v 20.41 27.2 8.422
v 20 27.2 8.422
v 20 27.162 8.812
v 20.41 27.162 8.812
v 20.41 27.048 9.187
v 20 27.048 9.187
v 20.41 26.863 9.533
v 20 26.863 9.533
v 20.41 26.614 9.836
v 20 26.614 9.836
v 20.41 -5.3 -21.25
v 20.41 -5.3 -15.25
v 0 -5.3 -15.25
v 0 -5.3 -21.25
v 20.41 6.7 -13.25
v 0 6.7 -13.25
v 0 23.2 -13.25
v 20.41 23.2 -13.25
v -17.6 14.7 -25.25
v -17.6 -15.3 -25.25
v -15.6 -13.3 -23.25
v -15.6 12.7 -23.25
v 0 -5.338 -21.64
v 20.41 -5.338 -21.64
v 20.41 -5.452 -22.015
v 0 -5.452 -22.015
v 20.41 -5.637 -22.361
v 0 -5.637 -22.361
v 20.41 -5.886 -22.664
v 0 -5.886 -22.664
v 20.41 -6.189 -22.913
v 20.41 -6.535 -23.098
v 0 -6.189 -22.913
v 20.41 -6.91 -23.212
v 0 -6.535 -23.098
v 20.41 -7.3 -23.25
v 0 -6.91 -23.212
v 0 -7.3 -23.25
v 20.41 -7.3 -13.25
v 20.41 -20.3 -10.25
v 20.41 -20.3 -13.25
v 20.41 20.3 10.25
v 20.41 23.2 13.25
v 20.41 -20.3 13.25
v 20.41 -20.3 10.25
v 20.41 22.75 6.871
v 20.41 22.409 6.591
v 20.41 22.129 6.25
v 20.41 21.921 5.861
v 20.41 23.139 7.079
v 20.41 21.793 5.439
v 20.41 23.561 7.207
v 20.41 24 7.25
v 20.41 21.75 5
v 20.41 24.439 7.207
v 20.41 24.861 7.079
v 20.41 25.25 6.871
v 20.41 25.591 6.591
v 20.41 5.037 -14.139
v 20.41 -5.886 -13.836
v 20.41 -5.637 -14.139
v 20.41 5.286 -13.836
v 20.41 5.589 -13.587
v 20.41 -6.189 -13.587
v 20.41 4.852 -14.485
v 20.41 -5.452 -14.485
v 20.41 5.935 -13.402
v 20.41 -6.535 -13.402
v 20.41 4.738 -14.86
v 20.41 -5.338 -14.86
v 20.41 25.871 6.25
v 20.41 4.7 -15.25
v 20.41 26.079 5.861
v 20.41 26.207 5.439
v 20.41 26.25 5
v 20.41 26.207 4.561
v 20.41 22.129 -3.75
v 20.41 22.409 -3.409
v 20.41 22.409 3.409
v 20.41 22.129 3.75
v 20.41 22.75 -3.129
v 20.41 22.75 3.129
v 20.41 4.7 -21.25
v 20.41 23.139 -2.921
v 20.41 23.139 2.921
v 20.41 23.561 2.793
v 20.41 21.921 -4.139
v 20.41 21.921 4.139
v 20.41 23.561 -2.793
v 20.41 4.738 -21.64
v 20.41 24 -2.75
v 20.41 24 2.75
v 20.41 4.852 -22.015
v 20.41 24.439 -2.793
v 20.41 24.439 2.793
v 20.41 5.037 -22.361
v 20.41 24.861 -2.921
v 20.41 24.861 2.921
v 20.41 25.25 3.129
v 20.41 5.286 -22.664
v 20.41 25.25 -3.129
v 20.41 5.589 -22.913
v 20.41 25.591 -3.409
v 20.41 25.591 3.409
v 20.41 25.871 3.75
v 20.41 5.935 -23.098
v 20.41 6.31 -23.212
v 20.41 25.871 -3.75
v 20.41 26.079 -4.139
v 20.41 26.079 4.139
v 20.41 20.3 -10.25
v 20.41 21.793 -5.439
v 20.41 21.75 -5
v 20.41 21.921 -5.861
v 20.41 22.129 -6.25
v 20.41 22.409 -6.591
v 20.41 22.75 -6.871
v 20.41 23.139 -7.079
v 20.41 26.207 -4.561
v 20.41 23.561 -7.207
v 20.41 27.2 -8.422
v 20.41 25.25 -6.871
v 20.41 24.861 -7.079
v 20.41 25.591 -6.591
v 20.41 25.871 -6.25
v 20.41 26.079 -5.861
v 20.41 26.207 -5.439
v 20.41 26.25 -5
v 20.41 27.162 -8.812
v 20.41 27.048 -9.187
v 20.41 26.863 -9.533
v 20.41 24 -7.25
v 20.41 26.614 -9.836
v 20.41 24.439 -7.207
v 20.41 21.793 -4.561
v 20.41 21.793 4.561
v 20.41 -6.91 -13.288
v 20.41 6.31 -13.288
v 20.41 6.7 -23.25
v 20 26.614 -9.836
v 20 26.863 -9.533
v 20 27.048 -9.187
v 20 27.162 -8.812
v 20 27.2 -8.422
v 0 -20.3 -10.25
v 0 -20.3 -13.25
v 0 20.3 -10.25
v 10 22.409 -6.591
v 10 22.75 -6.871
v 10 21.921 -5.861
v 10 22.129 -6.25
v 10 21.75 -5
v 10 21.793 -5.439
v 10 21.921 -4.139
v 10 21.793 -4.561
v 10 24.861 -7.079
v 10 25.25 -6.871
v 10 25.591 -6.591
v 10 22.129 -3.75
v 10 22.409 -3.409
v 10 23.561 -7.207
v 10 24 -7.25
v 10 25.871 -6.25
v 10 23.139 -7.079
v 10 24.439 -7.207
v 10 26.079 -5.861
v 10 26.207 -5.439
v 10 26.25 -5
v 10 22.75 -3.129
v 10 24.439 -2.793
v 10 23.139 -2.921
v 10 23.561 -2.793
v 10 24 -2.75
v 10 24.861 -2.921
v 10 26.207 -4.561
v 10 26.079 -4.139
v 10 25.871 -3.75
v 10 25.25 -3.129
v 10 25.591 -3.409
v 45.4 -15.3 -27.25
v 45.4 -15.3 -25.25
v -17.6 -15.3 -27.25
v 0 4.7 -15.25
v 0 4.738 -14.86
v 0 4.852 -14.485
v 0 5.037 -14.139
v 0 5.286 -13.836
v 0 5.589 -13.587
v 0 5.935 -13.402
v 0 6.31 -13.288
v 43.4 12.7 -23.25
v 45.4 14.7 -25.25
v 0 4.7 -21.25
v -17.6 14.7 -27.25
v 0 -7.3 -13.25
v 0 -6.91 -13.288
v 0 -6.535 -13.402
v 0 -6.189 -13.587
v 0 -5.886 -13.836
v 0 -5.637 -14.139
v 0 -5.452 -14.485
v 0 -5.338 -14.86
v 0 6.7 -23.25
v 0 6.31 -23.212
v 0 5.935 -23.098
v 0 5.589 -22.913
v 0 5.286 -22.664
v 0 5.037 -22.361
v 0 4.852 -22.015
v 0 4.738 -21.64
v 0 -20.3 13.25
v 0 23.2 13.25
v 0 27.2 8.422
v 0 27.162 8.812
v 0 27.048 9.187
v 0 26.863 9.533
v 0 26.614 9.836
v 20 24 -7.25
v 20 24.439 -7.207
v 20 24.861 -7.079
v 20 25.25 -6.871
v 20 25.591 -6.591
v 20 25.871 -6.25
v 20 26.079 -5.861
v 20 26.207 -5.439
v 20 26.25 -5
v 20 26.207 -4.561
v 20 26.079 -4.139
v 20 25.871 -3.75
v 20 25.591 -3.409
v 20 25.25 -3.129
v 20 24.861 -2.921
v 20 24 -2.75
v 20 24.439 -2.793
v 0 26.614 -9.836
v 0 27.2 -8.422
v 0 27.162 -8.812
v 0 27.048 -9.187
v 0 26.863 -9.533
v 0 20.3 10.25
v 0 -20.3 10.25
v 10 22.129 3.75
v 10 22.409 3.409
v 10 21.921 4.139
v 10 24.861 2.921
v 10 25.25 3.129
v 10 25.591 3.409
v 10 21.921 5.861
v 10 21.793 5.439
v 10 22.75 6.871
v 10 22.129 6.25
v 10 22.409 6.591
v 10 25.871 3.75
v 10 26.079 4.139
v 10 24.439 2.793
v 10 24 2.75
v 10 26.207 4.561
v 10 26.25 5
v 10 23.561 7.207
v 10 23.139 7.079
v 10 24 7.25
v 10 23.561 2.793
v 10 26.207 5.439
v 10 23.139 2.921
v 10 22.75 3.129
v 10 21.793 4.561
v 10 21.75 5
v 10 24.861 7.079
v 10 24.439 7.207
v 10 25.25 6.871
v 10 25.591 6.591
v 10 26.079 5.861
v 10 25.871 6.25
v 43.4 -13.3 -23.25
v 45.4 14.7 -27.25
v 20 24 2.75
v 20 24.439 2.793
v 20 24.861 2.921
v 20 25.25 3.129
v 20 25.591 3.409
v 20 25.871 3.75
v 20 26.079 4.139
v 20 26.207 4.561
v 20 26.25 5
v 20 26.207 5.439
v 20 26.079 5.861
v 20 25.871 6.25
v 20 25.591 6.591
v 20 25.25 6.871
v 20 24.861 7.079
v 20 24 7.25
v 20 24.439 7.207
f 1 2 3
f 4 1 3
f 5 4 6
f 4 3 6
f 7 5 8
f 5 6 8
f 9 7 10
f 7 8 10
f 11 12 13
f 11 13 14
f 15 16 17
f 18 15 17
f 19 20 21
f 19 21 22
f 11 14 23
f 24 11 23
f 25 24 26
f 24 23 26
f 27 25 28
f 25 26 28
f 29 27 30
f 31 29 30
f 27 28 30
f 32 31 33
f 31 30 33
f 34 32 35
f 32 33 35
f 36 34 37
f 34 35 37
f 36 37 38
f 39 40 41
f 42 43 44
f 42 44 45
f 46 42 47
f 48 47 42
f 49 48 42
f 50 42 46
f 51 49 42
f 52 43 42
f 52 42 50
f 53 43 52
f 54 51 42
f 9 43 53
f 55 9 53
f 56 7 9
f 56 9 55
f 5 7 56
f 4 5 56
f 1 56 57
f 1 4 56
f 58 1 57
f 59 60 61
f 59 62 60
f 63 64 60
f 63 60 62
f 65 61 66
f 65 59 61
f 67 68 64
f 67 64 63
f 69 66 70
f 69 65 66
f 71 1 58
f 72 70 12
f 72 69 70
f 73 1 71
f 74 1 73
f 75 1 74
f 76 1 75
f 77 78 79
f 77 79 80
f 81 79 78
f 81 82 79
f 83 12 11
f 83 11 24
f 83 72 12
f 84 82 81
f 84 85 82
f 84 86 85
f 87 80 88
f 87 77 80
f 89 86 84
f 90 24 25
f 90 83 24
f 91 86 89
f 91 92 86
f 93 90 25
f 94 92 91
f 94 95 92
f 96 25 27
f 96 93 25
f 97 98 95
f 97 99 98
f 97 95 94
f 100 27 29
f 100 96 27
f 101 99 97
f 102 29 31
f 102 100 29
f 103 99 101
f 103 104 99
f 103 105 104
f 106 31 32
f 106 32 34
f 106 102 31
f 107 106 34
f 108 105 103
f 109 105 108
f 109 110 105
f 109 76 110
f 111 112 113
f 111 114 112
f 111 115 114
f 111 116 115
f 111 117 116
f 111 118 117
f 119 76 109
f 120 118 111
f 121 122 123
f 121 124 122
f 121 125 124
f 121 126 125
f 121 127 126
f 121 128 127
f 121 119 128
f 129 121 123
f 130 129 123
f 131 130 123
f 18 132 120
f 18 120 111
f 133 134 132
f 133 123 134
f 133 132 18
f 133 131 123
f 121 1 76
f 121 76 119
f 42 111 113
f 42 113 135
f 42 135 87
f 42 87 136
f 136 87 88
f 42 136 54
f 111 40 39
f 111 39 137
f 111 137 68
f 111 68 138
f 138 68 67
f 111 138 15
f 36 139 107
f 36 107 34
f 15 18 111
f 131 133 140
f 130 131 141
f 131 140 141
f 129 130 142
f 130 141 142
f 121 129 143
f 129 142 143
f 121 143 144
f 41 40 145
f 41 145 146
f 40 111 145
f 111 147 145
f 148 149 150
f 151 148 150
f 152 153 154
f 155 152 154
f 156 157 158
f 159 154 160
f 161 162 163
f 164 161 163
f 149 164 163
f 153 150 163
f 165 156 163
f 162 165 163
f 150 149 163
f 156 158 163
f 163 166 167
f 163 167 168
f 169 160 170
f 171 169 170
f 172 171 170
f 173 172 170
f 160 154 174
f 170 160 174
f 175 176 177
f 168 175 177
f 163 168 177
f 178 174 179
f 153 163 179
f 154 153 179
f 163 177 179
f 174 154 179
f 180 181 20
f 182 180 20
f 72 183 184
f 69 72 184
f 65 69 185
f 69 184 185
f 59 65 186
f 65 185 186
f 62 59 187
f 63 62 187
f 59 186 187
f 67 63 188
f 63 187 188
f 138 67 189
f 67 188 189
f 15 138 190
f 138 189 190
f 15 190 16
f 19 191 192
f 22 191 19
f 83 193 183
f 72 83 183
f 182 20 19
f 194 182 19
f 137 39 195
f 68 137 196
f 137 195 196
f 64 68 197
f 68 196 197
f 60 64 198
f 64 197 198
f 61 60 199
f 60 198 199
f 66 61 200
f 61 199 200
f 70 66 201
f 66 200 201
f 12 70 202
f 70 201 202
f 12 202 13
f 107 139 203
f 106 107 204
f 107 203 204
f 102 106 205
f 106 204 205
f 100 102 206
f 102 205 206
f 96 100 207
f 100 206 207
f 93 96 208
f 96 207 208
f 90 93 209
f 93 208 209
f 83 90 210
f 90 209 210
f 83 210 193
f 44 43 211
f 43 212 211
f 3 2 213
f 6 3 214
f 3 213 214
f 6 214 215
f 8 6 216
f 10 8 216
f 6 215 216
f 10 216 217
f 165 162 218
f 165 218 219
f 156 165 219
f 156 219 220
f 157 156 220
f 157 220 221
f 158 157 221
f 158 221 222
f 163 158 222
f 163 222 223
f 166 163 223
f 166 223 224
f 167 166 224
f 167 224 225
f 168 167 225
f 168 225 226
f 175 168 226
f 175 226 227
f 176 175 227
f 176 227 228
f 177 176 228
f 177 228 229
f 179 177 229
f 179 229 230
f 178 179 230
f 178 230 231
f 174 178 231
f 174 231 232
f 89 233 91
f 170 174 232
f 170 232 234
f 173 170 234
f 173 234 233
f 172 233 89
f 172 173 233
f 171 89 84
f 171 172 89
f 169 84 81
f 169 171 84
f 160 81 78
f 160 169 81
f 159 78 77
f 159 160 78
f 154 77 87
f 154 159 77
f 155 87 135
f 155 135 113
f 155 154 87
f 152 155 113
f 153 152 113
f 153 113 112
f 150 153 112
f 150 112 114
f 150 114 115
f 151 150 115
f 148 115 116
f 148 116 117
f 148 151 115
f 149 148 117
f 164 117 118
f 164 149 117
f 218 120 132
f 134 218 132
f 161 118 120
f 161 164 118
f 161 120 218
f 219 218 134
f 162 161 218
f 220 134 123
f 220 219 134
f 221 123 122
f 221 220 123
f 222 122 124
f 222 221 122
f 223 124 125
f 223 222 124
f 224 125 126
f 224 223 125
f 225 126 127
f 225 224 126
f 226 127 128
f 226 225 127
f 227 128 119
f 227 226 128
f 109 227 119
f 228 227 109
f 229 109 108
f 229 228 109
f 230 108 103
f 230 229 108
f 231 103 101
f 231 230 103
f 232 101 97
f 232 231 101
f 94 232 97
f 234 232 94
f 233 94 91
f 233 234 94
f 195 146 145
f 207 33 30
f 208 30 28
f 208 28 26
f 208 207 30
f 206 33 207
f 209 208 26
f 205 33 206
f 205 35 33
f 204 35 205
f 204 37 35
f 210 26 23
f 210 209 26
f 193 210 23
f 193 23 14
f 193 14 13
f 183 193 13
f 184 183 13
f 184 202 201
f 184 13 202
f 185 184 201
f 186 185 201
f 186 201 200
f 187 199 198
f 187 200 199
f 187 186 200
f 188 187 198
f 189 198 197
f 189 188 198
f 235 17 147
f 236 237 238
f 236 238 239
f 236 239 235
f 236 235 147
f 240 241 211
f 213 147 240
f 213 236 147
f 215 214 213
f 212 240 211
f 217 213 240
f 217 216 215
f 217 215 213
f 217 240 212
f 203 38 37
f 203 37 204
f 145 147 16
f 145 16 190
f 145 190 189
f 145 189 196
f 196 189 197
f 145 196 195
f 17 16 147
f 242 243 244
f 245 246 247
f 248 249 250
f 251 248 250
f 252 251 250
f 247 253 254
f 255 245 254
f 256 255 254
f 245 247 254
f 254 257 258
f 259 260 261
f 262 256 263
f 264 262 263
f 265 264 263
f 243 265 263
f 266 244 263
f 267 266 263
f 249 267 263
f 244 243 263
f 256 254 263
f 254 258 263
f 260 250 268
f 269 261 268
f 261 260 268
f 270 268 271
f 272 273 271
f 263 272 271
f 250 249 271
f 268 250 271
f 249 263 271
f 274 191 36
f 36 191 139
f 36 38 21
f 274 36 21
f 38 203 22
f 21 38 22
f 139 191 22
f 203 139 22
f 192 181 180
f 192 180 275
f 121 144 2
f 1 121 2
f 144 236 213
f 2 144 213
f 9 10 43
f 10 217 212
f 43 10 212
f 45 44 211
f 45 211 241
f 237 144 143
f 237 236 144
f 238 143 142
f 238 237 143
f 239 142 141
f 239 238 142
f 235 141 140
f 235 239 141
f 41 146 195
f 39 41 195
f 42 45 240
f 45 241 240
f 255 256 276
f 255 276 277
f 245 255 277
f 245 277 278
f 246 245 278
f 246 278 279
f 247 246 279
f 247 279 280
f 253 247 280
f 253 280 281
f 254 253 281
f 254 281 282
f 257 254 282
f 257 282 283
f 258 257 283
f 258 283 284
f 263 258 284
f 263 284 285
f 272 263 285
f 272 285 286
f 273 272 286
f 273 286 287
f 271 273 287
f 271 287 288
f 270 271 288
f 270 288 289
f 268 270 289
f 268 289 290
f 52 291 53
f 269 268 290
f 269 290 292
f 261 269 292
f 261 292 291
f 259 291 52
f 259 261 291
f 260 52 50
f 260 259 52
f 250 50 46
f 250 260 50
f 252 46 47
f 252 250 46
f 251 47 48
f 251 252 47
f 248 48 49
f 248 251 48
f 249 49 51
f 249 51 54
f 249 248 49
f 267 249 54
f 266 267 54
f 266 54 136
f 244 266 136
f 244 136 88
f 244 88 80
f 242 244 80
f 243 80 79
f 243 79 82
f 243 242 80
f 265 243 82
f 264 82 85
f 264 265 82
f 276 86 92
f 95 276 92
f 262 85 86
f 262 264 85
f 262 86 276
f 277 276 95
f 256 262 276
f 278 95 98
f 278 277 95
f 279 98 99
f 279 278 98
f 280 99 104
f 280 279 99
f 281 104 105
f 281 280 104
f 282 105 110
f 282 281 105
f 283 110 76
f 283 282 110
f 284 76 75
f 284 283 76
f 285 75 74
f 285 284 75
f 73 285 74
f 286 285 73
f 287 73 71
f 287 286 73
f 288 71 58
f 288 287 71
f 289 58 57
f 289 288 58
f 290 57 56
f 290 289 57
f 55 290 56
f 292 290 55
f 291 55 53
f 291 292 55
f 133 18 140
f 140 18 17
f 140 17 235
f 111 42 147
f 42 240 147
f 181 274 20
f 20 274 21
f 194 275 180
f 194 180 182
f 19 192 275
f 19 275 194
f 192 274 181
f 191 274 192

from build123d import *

# Parameters (mm, degrees)
SKETCH1_R           = 2.25
BOSS_EXTRUDE1_DEPTH = 20
SKETCH2_R           = 2.25
BOSS_EXTRUDE2_DEPTH = 10
SKETCH4_W           = 26.5
SKETCH4_H           = 2.5
CUT_EXTRUDE1_DEPTH  = 39.17921555
CHAMFER2_SIZE       = 4
CHAMFER3_SIZE       = 4
FILLET4_R           = 2
SKETCH7_W           = 10
SKETCH7_H           = 10
BOSS_EXTRUDE5_DEPTH = 20
FILLET6_R           = 2
SKETCH8_W           = 63
SKETCH8_H           = 30
BOSS_EXTRUDE6_DEPTH = 4
CHAMFER4_SIZE       = 2
FILLET7_R           = 2
SKETCH13_R          = 2.25
BOSS_EXTRUDE7_DEPTH = 0.41


with BuildPart() as part:
    # Sketch1 → Boss-Extrude1 (new body)
    with BuildSketch(Plane(origin=(0, 0, 0), x_dir=(0, 0, -1), z_dir=(1, 0, 0))):
        Polygon((10.25, -20.3), (13.25, -20.3), (13.25, 29.7), (-13.25, 29.7), (-13.25, -20.3), (-10.25, -20.3), (-10.25, 20.3), (10.25, 20.3), align=None)
        with Locations((5, 24)):
            Circle(SKETCH1_R, mode=Mode.SUBTRACT)
        with Locations((-5, 24)):
            Circle(SKETCH1_R, mode=Mode.SUBTRACT)
    extrude(amount=BOSS_EXTRUDE1_DEPTH)

    # Sketch2 → Boss-Extrude2 (add)
    with BuildSketch(Plane.ZY):
        with Locations((-5, 24)):
            Circle(SKETCH2_R)
        with Locations((5, 24)):
            Circle(SKETCH2_R)
    extrude(amount=-BOSS_EXTRUDE2_DEPTH)

    # Sketch4 → Cut-Extrude1 (cut, through all)
    with BuildSketch(Plane(origin=(20, 0, 0), x_dir=(0, 0, -1), z_dir=(1, 0, 0))):
        with Locations((0, 28.45)):
            Rectangle(SKETCH4_W, SKETCH4_H)
    extrude(amount=-CUT_EXTRUDE1_DEPTH, mode=Mode.SUBTRACT)

    # Chamfer2
    chamfer2_edges = [part.edges().sort_by_distance(p)[0] for p in [
        (10, 27.2, -13.25),
    ]]
    chamfer(chamfer2_edges, length=CHAMFER2_SIZE)

    # Chamfer3
    chamfer3_edges = [part.edges().sort_by_distance(p)[0] for p in [
        (10, 27.2, 13.25),
    ]]
    chamfer(chamfer3_edges, length=CHAMFER3_SIZE)

    # Fillet4
    fillet4_edges = [part.edges().sort_by_distance(p)[0] for p in [
        (10, 27.2, -9.25),
        (10, 27.2, 9.25),
    ]]
    fillet(fillet4_edges, radius=FILLET4_R)

    # Sketch7 → Boss-Extrude5 (add)
    with BuildSketch(Plane(origin=(20, 0, 0), x_dir=(0, 0, -1), z_dir=(1, 0, 0))):
        with Locations((18.25, -0.3)):
            Rectangle(SKETCH7_W, SKETCH7_H)
    extrude(amount=-BOSS_EXTRUDE5_DEPTH)

    # Fillet6
    fillet6_edges = [part.edges().sort_by_distance(p)[0] for p in [
        (10, -5.3, -13.25),
        (10, 4.7, -13.25),
    ]]
    fillet(fillet6_edges, radius=FILLET6_R)

    # Sketch8 → Boss-Extrude6 (add)
    with BuildSketch(Plane(origin=(0, 0, -23.25), x_dir=(-1, 0, 0), z_dir=(0, 0, -1))):
        with Locations((-13.9, -0.3)):
            Rectangle(SKETCH8_W, SKETCH8_H)
    extrude(amount=BOSS_EXTRUDE6_DEPTH)

    # Chamfer4
    chamfer4_edges = [part.edges().sort_by_distance(p)[0] for p in [
        (45.4, -0.3, -23.25),
        (13.9, -15.3, -23.25),
        (-17.6, -0.3, -23.25),
        (13.9, 14.7, -23.25),
    ]]
    chamfer(chamfer4_edges, length=CHAMFER4_SIZE)

    # Fillet7
    fillet7_edges = [part.edges().sort_by_distance(p)[0] for p in [
        (10, 4.7, -23.25),
        (10, -5.3, -23.25),
    ]]
    fillet(fillet7_edges, radius=FILLET7_R)

    # Sketch13 → Boss-Extrude7 (add)
    with BuildSketch(Plane(origin=(20, 0, 0), x_dir=(0, 0, -1), z_dir=(1, 0, 0))):
        with BuildLine():
            Line((13.25, 23.2), (9.835786438, 26.614213562))
            ThreePointArc((9.835786438, 26.614213562), (9.18693974, 27.047759065), (8.421572875, 27.2))
            Line((8.421572875, 27.2), (-8.421572875, 27.2))
            ThreePointArc((-8.421572875, 27.2), (-9.18693974, 27.047759065), (-9.835786438, 26.614213562))
            Line((-9.835786438, 26.614213562), (-13.25, 23.2))
            Line((-13.25, 23.2), (-13.25, -20.3))
            Line((-13.25, -20.3), (-10.25, -20.3))
            Line((-10.25, -20.3), (-10.25, 20.3))
            Line((-10.25, 20.3), (10.25, 20.3))
            Line((10.25, 20.3), (10.25, -20.3))
            Line((10.25, -20.3), (13.25, -20.3))
            Line((13.25, -20.3), (13.25, -7.3))
            ThreePointArc((13.25, -7.3), (13.835786438, -5.885786438), (15.25, -5.3))
            Line((15.25, -5.3), (21.25, -5.3))
            ThreePointArc((21.25, -5.3), (22.664213562, -5.885786438), (23.25, -7.3))
            Line((23.25, -7.3), (23.25, 6.7))
            ThreePointArc((23.25, 6.7), (22.664213562, 5.285786438), (21.25, 4.7))
            Line((21.25, 4.7), (15.25, 4.7))
            ThreePointArc((15.25, 4.7), (13.835786438, 5.285786438), (13.25, 6.7))
            Line((13.25, 6.7), (13.25, 23.2))
        make_face()
        with Locations(Location((5, 24, 0), (0, 0, 180))):
            Circle(SKETCH13_R, mode=Mode.SUBTRACT)
        with Locations(Location((-5, 24, 0), (0, 0, 180))):
            Circle(SKETCH13_R, mode=Mode.SUBTRACT)
    extrude(amount=BOSS_EXTRUDE7_DEPTH)


solid = part.part
